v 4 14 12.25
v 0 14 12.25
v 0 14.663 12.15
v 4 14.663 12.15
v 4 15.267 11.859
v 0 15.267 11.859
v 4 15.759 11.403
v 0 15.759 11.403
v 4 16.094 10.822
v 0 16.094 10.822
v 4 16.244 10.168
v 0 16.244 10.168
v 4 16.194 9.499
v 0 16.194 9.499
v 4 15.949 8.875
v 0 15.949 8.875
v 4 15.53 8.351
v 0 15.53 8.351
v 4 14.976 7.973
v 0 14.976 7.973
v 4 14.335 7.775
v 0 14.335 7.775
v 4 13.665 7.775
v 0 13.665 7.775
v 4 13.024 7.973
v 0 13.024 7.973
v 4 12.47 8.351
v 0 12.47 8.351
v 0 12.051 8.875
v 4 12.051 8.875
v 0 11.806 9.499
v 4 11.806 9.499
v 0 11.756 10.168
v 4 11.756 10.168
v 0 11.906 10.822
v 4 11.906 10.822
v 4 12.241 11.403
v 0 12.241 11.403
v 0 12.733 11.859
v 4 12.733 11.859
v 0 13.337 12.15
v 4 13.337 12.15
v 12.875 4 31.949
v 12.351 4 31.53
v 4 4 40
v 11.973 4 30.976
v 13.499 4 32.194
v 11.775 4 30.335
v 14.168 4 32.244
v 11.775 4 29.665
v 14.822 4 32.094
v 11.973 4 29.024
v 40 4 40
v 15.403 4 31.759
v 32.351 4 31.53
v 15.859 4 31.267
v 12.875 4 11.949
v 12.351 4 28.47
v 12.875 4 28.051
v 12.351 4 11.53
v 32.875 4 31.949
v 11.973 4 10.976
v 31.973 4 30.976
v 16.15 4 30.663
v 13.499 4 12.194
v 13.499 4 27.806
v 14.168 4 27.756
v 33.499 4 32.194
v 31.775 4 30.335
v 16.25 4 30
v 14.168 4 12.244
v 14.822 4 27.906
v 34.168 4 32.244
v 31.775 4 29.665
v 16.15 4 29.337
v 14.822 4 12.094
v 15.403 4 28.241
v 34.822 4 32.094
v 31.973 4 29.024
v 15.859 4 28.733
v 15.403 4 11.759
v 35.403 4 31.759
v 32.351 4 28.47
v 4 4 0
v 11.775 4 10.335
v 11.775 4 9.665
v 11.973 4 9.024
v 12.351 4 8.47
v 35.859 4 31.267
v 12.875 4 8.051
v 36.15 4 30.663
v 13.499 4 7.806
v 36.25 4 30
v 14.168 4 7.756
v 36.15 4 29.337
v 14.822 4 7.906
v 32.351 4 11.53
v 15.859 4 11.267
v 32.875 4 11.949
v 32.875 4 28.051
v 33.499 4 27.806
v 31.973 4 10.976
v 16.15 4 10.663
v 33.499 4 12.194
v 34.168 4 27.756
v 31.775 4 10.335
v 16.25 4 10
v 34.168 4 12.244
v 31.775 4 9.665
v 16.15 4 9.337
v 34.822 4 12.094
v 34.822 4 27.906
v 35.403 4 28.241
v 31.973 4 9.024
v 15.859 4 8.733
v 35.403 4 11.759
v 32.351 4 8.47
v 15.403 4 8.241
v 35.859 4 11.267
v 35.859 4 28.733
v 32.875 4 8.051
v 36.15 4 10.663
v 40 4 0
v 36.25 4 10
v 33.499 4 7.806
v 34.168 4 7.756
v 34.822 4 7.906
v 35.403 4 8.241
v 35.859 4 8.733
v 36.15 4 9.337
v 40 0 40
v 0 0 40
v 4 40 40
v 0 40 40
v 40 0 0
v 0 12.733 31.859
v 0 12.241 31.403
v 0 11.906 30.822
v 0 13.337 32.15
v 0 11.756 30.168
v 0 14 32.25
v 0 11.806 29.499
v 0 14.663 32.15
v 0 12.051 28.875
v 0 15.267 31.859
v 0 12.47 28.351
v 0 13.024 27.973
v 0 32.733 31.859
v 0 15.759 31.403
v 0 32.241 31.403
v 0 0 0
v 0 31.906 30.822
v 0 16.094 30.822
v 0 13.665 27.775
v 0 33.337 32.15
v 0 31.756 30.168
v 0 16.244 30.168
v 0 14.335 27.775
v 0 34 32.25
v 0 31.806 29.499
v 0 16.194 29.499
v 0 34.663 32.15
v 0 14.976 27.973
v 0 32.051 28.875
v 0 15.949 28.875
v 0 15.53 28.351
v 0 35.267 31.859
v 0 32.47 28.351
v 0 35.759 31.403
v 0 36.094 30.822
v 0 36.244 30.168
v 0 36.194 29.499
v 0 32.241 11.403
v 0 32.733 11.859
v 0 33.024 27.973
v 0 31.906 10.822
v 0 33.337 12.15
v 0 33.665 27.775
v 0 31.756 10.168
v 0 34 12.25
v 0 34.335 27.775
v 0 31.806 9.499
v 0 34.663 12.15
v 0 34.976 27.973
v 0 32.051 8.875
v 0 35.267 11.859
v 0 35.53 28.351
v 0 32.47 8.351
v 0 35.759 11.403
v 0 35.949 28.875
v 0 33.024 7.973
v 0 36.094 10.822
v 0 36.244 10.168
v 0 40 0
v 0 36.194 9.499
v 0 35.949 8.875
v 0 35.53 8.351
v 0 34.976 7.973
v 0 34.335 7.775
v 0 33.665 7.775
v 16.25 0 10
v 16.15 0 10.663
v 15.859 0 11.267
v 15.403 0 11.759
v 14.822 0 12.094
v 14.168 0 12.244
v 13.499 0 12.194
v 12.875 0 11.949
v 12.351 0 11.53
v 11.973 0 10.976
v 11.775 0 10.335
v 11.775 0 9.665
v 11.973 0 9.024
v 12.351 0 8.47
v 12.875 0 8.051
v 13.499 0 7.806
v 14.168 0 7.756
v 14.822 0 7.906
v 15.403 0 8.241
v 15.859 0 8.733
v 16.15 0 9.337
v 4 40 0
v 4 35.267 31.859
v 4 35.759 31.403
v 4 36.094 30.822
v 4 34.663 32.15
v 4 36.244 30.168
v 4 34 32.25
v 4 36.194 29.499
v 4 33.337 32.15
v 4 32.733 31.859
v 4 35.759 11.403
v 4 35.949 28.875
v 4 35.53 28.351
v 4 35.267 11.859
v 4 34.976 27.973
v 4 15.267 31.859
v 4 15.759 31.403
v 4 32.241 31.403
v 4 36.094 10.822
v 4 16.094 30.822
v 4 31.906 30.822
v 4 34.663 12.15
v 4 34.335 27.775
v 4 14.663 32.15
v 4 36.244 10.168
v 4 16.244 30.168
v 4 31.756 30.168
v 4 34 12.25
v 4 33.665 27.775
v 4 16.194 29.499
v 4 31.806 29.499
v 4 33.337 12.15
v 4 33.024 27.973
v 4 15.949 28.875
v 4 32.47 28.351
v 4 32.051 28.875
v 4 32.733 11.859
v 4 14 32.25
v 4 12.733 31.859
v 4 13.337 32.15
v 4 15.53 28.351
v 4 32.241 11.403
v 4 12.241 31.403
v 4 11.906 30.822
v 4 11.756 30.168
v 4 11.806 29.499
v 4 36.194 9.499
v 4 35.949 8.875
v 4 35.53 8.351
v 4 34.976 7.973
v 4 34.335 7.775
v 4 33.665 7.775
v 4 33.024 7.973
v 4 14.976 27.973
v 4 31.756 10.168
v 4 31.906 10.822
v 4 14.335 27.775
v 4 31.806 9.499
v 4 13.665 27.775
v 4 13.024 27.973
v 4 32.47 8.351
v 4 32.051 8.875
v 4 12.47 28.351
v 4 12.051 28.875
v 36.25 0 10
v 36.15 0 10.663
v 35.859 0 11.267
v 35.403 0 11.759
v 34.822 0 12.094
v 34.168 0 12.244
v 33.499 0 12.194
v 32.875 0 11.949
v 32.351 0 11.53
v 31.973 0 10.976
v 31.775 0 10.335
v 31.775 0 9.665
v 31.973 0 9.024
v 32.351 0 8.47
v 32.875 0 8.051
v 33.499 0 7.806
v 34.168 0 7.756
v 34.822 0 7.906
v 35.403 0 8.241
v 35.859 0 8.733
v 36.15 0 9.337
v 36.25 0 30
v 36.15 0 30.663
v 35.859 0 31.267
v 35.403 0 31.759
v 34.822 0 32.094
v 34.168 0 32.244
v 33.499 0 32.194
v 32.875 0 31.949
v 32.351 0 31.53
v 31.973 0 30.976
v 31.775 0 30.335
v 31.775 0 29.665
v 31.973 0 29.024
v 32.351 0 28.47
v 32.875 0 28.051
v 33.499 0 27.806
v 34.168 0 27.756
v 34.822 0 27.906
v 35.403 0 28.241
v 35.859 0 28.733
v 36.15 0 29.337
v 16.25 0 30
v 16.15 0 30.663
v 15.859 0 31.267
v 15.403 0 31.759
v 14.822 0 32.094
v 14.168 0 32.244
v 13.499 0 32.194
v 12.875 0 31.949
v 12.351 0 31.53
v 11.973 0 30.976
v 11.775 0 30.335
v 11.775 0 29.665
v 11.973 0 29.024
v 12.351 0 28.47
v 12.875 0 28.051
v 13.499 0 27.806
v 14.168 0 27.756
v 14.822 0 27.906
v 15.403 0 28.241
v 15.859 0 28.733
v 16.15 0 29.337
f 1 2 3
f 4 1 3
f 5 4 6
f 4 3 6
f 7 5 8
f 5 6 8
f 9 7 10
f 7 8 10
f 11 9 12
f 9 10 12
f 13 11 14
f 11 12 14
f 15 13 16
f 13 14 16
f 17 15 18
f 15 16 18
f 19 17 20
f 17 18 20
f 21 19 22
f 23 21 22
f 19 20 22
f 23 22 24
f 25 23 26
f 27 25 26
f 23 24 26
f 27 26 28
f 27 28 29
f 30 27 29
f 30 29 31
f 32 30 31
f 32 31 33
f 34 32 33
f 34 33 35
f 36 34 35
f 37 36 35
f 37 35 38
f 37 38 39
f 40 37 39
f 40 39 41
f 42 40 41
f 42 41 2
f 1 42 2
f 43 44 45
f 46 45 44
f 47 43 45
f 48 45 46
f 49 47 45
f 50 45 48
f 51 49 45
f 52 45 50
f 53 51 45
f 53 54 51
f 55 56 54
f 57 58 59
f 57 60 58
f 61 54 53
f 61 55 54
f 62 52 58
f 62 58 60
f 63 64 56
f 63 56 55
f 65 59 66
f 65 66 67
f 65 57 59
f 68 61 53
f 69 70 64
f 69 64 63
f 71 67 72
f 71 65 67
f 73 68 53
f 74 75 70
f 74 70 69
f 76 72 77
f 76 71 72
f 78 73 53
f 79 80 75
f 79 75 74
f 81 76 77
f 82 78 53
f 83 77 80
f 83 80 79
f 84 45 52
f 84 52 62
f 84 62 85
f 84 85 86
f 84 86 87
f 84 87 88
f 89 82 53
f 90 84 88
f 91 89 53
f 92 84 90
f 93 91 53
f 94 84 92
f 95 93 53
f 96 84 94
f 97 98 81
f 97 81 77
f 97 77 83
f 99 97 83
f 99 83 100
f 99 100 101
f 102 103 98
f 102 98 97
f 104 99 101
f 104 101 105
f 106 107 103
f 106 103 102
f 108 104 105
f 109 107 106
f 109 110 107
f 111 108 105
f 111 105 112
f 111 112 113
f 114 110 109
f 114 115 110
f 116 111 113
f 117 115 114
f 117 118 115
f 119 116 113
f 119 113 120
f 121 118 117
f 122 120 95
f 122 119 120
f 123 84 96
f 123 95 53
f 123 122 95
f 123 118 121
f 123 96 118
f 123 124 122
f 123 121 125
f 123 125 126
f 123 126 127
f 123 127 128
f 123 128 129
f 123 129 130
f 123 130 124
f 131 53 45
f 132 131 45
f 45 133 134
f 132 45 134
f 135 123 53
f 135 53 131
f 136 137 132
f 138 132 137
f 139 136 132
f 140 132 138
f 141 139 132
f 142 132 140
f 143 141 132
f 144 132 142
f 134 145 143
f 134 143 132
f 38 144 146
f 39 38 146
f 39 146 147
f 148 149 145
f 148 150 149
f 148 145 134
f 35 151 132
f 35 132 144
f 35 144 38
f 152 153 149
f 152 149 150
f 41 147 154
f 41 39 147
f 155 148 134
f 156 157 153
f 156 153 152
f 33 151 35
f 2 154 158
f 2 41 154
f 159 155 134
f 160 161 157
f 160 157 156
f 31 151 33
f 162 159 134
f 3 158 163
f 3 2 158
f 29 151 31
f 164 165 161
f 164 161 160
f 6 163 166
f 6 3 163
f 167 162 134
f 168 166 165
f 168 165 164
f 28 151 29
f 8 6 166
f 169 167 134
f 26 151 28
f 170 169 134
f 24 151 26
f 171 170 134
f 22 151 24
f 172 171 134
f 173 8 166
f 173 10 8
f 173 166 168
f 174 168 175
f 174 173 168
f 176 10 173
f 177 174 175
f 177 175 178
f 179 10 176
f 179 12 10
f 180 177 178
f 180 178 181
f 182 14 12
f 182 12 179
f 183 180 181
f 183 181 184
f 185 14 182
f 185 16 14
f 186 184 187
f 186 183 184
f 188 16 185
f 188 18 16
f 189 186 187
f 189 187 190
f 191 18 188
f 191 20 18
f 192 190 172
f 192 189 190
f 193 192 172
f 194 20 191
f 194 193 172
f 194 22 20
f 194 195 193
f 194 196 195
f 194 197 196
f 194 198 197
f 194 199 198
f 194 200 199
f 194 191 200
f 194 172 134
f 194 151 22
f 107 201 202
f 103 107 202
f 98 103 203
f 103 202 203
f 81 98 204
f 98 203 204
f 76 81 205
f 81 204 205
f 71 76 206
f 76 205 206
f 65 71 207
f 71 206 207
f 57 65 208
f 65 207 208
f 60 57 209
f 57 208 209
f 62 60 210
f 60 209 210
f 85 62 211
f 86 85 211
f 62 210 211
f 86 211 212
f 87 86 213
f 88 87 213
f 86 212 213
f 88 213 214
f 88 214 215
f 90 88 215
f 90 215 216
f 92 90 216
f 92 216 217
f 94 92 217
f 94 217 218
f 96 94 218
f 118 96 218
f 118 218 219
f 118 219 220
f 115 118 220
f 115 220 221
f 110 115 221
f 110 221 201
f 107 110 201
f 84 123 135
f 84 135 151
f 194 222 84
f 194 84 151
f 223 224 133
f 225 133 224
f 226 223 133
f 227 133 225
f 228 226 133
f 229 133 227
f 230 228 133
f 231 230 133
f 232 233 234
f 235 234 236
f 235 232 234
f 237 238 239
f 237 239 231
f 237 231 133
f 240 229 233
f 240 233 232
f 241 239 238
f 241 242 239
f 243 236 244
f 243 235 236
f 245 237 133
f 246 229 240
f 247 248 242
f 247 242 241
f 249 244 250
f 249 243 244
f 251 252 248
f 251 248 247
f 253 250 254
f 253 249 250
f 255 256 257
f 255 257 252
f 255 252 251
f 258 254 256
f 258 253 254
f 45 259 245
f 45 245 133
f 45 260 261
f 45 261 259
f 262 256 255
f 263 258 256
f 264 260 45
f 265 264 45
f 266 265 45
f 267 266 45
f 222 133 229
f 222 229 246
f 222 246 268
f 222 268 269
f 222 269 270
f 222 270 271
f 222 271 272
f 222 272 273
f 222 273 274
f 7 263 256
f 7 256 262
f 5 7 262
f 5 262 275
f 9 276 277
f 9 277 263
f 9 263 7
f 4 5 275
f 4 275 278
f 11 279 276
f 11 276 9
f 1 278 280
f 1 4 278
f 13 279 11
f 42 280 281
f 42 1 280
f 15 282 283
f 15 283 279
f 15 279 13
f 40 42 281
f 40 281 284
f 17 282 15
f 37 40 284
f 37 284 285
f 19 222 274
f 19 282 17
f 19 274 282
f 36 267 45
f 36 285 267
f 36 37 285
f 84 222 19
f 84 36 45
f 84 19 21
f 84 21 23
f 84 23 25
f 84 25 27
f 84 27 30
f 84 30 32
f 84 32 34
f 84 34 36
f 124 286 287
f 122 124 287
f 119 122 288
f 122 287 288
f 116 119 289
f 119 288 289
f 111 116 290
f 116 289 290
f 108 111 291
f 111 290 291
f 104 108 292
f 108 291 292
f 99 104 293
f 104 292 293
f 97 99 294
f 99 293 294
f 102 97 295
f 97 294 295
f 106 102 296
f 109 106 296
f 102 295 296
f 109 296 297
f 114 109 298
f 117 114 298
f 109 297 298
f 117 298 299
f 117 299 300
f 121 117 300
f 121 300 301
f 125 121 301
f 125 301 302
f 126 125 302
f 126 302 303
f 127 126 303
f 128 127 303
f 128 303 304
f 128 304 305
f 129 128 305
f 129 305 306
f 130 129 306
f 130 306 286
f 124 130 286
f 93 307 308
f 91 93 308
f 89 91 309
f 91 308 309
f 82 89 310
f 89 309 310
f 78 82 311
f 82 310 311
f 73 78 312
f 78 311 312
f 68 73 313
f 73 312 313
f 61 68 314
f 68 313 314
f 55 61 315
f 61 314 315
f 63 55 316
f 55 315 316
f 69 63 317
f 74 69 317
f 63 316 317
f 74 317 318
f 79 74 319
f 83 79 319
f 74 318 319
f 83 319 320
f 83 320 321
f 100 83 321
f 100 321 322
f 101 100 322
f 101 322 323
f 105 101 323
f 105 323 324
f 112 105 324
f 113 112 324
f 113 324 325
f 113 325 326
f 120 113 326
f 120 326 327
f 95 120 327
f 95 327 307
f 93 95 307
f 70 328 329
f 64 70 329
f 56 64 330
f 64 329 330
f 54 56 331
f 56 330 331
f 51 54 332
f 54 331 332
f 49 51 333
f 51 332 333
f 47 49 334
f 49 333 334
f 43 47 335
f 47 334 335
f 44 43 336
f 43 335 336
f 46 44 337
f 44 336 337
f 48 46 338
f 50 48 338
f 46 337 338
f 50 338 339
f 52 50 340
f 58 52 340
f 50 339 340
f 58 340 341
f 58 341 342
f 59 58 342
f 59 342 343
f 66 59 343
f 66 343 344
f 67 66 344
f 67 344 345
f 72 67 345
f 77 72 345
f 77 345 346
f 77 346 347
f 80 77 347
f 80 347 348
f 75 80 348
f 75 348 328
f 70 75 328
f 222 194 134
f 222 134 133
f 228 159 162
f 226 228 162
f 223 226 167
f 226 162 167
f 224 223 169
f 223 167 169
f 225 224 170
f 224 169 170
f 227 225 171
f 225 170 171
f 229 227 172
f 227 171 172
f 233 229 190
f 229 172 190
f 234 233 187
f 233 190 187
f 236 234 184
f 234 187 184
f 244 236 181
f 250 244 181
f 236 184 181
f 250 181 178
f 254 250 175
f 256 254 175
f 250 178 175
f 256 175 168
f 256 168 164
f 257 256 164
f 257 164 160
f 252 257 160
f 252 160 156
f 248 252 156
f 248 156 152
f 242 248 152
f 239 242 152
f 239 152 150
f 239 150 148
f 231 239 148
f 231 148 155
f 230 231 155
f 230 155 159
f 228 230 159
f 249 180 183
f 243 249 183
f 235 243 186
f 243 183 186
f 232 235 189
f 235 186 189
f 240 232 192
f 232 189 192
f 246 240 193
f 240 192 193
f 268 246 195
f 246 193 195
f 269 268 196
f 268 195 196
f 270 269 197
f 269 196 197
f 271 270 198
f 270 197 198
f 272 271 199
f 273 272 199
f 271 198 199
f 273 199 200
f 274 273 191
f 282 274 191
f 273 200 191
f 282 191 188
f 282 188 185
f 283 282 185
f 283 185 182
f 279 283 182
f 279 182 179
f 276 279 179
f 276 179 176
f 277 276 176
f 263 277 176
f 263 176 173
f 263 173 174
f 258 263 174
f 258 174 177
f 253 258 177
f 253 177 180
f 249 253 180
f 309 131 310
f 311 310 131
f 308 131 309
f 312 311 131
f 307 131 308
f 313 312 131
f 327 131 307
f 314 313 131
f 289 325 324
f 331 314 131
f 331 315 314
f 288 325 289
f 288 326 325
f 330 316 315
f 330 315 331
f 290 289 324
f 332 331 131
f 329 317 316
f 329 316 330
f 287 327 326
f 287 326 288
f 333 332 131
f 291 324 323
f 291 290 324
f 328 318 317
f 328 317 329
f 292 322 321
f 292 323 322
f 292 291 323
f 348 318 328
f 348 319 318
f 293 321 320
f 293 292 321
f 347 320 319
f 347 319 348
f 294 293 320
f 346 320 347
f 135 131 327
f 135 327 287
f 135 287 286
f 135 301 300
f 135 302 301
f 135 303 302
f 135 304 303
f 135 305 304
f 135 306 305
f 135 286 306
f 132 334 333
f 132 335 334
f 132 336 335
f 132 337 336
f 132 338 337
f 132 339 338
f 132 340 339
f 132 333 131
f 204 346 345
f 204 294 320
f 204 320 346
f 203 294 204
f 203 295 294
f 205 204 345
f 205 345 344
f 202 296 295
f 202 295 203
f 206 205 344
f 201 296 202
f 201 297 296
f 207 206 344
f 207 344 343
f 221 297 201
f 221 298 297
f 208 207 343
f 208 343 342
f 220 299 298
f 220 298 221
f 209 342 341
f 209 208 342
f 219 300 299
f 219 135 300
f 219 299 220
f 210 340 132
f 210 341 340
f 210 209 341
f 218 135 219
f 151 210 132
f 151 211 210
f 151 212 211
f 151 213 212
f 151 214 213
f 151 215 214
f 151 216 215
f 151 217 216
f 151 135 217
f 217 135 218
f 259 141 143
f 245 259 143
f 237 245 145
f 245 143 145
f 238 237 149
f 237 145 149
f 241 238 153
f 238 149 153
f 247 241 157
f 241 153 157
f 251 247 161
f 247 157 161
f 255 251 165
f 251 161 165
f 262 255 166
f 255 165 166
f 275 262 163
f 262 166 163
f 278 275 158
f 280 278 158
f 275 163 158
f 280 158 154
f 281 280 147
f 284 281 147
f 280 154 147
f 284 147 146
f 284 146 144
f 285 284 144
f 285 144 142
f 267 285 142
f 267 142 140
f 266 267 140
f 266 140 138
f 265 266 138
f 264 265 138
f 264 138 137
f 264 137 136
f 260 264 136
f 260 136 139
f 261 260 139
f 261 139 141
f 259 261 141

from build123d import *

# Parameters (mm, degrees)
EXTRUDE_1_DEPTH       = 40
HOLE_WIZARD_M41_D     = 4.5
HOLE_WIZARD_M41_DEPTH = 5
HOLE_WIZARD_M41_TIP   = 1.351936393
HOLE_WIZARD_M42_D     = 4.5
HOLE_WIZARD_M42_DEPTH = 5
HOLE_WIZARD_M42_TIP   = 1.351936393


with BuildPart() as part:
    # Эскиз1 → Бобышка-Вытянуть1 (new body)
    with BuildSketch(Plane.XY):
        Polygon((0, 0), (0, 40), (4, 40), (4, 4), (40, 4), (40, 0), align=None)
    extrude(amount=EXTRUDE_1_DEPTH)

    # Отверстие с зазором M41
    with Locations(Plane(origin=(0, 4, 0), x_dir=(-1, 0, 0), z_dir=(0, 1, 0))):
        with Locations((-34, 10), (-14, 10), (-34, 30), (-14, 30)):
            Hole(HOLE_WIZARD_M41_D / 2, depth=HOLE_WIZARD_M41_DEPTH)
            with Locations((0, 0, -(HOLE_WIZARD_M41_DEPTH + HOLE_WIZARD_M41_TIP / 2))):  # 118° drill point
                Cone(0, HOLE_WIZARD_M41_D / 2, HOLE_WIZARD_M41_TIP, mode=Mode.SUBTRACT)

    # Отверстие с зазором M42
    with Locations(Plane(origin=(4, 0, 0), x_dir=(0, 0, -1), z_dir=(1, 0, 0))):
        with Locations((-10, 34), (-30, 34), (-10, 14), (-30, 14)):
            Hole(HOLE_WIZARD_M42_D / 2, depth=HOLE_WIZARD_M42_DEPTH)
            with Locations((0, 0, -(HOLE_WIZARD_M42_DEPTH + HOLE_WIZARD_M42_TIP / 2))):  # 118° drill point
                Cone(0, HOLE_WIZARD_M42_D / 2, HOLE_WIZARD_M42_TIP, mode=Mode.SUBTRACT)


solid = part.part
